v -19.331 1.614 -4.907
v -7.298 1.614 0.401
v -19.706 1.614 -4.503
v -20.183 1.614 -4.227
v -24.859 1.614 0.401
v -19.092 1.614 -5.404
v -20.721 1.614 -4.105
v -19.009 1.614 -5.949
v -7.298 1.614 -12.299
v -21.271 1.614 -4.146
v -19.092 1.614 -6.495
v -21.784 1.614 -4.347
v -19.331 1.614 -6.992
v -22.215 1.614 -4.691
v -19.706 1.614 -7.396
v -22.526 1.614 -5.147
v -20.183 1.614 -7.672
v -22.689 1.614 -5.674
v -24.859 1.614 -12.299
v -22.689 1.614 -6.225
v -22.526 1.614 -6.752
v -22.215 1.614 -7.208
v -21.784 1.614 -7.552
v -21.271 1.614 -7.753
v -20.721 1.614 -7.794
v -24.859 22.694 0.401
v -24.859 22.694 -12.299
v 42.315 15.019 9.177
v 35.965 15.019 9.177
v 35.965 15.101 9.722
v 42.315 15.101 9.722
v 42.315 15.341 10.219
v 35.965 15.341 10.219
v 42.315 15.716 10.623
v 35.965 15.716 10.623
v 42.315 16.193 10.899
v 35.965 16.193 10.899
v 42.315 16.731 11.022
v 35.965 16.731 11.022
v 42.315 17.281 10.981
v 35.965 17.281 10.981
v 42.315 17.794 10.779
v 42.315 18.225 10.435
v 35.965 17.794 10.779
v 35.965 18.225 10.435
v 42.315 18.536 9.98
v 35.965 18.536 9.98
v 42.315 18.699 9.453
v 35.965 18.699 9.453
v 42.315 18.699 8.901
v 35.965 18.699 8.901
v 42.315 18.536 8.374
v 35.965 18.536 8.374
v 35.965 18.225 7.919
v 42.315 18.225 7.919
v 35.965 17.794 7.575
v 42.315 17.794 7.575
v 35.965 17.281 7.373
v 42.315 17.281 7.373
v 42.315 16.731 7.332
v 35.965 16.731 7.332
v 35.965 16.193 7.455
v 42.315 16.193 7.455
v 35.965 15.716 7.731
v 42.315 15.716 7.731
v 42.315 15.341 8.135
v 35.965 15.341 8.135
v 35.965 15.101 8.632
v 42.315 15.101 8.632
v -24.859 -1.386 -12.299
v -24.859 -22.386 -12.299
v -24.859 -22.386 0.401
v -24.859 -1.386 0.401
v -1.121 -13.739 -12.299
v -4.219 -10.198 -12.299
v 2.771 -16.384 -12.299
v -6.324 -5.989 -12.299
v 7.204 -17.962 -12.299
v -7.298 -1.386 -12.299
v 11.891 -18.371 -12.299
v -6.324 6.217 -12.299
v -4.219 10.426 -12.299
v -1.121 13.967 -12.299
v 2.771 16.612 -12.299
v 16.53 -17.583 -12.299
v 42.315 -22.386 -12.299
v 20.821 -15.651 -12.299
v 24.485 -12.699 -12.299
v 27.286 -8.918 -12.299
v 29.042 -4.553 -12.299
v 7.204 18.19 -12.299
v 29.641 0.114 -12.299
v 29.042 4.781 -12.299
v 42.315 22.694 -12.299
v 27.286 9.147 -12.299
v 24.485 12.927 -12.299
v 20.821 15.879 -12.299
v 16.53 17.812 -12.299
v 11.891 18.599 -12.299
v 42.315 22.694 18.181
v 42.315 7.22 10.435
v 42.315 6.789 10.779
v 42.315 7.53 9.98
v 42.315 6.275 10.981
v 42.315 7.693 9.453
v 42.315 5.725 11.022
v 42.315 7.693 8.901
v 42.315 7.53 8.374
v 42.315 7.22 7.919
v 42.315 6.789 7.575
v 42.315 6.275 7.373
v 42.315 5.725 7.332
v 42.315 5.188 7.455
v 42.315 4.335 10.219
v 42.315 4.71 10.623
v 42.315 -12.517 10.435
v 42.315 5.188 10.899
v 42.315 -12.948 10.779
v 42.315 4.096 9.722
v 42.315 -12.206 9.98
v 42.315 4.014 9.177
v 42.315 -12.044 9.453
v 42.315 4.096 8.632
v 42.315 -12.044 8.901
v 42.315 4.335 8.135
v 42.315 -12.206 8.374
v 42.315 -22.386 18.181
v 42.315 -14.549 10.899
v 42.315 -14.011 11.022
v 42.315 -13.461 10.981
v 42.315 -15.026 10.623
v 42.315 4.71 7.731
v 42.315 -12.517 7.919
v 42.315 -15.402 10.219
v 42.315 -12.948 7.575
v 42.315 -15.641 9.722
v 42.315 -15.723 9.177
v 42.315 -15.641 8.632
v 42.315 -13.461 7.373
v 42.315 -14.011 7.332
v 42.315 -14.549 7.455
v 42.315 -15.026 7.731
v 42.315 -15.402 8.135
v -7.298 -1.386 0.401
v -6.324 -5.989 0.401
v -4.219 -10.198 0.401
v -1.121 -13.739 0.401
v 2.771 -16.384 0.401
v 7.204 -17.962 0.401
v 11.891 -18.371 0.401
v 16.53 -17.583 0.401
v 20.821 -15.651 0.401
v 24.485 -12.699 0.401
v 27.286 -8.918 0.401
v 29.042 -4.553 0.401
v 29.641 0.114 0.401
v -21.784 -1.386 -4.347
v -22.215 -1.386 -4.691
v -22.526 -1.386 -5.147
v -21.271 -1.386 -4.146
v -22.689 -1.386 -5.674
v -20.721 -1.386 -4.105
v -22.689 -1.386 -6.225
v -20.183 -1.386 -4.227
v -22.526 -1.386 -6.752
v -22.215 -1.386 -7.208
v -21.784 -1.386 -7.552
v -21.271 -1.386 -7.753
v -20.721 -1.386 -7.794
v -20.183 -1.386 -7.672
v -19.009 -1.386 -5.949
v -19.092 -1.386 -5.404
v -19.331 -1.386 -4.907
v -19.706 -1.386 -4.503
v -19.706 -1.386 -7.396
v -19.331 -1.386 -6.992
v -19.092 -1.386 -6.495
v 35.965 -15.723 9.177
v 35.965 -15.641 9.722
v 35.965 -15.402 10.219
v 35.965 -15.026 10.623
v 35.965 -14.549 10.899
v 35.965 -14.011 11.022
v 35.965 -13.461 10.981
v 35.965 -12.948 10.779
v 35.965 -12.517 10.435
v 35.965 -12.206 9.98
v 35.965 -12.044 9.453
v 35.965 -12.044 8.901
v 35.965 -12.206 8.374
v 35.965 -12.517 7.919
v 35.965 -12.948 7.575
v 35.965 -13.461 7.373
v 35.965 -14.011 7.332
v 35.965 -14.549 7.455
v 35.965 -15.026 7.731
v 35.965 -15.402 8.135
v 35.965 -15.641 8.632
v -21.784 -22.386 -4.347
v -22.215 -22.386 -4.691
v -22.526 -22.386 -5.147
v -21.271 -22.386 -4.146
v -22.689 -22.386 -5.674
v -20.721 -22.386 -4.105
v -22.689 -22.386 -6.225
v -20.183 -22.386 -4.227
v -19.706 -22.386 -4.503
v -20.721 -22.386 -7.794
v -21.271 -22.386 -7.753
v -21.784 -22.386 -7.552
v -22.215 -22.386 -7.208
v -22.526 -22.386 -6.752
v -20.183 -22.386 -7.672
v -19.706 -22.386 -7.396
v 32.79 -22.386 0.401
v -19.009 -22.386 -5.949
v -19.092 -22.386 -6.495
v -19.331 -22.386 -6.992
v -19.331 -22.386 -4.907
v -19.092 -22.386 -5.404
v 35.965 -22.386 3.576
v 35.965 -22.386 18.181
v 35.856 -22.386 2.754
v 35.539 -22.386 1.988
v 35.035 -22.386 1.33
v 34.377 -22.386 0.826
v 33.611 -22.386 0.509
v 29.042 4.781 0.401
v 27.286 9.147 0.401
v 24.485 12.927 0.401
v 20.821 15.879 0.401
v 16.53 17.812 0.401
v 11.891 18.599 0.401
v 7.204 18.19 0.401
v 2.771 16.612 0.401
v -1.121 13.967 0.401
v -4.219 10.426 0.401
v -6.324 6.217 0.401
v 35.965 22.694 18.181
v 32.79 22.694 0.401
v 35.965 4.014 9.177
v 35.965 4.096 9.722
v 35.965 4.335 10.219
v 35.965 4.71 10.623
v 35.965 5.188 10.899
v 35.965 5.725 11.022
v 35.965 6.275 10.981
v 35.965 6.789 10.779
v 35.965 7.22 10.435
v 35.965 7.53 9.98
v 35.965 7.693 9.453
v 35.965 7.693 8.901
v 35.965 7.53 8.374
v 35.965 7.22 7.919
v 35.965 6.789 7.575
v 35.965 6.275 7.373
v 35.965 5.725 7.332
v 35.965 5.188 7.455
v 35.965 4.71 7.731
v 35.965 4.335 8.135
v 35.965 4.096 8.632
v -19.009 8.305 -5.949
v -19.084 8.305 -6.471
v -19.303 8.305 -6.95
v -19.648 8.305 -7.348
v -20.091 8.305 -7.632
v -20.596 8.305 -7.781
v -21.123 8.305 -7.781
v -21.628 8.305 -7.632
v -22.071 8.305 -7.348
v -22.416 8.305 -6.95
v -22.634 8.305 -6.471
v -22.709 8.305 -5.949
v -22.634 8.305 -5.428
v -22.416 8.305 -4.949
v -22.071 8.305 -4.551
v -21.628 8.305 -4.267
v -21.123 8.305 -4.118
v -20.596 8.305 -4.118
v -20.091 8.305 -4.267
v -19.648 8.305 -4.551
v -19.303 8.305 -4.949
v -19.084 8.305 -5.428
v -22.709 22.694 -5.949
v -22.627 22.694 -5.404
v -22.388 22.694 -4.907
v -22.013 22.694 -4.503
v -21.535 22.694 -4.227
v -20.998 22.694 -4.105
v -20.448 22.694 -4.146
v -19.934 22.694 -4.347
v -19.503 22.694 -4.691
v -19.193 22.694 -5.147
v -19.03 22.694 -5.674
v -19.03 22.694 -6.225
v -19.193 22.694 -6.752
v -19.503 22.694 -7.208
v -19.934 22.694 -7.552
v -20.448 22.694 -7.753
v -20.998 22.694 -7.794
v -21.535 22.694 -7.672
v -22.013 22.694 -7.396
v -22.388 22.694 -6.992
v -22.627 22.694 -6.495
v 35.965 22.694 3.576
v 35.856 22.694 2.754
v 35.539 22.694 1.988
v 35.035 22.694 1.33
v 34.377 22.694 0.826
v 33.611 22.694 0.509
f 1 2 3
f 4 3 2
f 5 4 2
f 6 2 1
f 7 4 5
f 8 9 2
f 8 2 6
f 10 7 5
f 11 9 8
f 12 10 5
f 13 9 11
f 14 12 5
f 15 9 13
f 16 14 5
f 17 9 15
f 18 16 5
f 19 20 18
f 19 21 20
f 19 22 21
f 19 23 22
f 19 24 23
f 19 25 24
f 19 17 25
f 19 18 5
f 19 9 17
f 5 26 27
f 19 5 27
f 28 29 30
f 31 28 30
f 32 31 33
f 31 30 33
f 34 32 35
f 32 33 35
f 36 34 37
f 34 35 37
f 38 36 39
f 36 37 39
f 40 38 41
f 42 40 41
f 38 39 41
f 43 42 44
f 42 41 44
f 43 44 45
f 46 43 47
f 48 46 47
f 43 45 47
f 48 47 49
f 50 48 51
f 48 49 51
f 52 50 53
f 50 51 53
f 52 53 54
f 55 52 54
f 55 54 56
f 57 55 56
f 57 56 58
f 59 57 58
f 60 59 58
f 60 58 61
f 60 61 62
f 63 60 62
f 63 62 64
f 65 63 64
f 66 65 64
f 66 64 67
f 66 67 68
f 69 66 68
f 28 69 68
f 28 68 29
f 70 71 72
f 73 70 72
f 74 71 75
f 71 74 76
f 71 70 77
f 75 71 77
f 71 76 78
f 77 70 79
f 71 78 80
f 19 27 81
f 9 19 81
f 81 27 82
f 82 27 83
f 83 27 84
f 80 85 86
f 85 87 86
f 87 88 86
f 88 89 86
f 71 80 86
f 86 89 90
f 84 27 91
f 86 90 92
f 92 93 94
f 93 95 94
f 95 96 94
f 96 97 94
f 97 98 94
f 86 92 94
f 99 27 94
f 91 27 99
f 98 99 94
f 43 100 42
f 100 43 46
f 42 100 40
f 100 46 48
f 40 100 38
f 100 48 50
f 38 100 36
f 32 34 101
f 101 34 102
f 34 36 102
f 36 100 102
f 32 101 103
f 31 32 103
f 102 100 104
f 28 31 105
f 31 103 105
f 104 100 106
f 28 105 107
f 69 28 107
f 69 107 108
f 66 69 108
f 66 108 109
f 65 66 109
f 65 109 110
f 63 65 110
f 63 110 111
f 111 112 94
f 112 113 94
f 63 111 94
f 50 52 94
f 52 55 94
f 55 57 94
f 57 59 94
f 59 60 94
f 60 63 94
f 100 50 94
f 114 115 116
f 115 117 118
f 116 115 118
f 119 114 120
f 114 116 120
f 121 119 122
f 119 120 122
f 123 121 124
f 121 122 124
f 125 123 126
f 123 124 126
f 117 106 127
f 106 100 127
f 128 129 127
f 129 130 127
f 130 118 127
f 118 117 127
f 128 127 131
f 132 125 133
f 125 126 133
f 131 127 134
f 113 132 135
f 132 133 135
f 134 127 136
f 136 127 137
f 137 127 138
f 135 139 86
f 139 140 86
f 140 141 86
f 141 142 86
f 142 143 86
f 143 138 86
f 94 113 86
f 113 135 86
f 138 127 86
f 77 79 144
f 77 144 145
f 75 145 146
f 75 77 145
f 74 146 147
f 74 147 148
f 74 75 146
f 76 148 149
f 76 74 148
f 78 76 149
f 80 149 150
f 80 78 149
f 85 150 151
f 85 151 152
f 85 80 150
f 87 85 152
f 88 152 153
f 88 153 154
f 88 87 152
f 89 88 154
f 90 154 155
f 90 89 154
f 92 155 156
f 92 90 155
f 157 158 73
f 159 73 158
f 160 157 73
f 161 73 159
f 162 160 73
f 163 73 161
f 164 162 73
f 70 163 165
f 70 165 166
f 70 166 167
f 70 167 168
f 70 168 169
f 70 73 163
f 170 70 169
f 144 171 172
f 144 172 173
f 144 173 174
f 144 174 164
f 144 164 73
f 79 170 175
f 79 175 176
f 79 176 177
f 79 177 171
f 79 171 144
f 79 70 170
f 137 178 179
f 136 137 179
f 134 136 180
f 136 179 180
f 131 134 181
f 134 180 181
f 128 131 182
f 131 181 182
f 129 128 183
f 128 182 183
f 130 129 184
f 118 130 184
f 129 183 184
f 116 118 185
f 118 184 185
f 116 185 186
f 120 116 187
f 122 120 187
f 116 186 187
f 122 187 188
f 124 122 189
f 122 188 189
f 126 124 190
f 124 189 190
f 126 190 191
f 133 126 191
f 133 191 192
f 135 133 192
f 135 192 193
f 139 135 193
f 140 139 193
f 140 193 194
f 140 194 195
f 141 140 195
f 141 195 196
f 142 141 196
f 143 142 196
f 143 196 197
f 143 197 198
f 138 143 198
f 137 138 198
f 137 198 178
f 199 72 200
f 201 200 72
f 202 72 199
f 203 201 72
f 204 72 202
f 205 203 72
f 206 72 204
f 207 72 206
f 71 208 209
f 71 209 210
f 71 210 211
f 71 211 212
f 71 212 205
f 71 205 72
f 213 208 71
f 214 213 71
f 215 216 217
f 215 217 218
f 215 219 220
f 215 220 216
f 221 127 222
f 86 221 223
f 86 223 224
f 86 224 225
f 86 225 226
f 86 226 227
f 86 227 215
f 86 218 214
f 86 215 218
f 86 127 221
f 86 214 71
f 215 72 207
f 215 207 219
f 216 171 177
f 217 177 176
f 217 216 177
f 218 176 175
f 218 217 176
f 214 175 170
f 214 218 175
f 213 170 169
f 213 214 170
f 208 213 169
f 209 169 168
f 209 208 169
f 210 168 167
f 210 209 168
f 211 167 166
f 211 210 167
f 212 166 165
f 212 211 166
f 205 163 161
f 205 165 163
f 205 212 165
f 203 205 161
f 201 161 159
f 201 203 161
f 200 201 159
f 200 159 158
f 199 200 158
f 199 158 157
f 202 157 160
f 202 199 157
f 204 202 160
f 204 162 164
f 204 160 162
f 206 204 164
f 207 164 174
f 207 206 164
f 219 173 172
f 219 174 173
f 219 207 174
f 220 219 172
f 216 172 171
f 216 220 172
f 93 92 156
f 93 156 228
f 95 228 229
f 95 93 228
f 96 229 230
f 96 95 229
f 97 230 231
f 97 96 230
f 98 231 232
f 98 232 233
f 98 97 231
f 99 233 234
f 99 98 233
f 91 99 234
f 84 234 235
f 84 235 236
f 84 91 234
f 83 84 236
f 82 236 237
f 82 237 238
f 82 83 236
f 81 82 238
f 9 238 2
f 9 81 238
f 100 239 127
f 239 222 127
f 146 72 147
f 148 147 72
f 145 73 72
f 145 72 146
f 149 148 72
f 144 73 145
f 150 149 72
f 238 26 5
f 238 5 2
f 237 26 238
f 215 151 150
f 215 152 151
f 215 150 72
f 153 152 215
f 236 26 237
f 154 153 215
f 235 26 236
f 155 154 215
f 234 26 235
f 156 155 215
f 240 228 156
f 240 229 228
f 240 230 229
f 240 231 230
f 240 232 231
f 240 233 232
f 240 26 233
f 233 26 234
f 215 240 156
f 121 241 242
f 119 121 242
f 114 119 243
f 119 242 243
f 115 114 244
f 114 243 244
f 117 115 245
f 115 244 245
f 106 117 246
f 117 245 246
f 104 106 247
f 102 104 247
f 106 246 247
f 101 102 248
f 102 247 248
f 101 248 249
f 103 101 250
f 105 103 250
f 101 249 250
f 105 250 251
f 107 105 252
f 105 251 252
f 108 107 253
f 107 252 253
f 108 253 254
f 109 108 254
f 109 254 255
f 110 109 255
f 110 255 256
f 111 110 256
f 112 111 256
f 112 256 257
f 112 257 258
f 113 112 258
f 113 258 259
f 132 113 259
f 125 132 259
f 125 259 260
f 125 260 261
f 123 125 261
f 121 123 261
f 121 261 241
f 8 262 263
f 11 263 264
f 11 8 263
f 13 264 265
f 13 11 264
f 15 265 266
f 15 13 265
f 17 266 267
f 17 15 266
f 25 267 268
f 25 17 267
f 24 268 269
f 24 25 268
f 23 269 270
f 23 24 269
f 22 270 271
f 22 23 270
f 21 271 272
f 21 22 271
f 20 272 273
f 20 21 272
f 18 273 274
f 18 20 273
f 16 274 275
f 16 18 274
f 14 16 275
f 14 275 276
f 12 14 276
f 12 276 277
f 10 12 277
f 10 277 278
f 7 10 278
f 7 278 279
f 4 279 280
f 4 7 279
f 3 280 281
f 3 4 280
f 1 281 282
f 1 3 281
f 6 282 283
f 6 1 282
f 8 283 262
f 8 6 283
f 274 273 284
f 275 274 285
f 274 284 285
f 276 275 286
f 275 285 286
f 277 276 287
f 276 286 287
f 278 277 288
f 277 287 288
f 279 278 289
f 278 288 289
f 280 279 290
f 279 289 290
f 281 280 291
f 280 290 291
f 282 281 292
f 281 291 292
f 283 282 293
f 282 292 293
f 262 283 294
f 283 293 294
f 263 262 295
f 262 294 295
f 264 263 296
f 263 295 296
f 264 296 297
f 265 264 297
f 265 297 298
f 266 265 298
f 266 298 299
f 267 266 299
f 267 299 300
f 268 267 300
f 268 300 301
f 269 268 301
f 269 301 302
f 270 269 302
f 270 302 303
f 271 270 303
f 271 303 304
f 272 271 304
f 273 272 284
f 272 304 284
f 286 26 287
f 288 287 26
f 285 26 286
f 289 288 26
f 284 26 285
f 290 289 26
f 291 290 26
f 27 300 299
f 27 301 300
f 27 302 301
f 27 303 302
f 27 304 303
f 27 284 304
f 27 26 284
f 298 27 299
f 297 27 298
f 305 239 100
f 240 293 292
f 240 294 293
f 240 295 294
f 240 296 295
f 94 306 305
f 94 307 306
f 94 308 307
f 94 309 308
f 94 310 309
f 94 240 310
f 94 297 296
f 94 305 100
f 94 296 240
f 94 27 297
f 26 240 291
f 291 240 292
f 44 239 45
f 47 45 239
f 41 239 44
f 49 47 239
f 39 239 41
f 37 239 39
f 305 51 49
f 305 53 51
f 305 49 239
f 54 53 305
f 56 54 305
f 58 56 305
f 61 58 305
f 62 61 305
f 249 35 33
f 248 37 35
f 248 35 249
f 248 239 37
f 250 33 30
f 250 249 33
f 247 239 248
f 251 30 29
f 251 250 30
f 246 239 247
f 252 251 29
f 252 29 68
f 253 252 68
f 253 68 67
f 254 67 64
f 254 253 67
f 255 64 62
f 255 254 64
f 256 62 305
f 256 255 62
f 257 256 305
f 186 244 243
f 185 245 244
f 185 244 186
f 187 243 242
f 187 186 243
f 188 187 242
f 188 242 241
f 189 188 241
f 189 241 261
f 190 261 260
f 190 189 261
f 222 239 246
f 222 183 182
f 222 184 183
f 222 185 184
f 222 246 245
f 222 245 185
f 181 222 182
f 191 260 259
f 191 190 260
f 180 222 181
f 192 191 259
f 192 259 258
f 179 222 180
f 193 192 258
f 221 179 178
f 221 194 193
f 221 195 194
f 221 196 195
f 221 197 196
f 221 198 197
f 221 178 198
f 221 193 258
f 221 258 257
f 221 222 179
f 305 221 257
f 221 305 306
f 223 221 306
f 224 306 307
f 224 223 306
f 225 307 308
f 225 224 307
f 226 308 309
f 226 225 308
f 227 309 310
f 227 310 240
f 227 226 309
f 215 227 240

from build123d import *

# Parameters (mm, degrees)
CUT_EXTRUDE1_START       = -22.385915399
CUT_EXTRUDE1_OUTLINE_R   = 1.85
CUT_EXTRUDE1_DEPTH       = 4
CUT_EXTRUDE1_START_2     = -18.385915399
CUT_EXTRUDE1_2_OUTLINE_R = 1.85
CUT_EXTRUDE1_2_DEPTH     = 40.98
CUT_EXTRUDE1_START_3     = -12.299495873
CUT_EXTRUDE1_3_DEPTH     = 12.7
SKETCH2_W                = 30.48
SKETCH2_H                = 44.98
BOSS_EXTRUDE1_DEPTH      = 6.35
CUT_EXTRUDE2_REACH       = 69.384
SKETCH3_R                = 1.85
BOSS_EXTRUDE3_REACH      = 66.446
SKETCH4_W                = 67.174
SKETCH4_H                = 12.7
SKETCH5_W                = 6.35
SKETCH5_H                = 17.78
BOSS_EXTRUDE4_DEPTH      = 0.1
FILLET1_R                = 3.175


with BuildPart() as part:
    # Cut-Extrude1: read off the stored shape, not the designer's step
    # Cut-Extrude1 outline → Cut-Extrude1 (new body)
    with BuildSketch(Plane(origin=(0, 0, 0), x_dir=(1, 0, 0), z_dir=(0, 1, 0)).offset(CUT_EXTRUDE1_START)):
        with BuildLine():
            ThreePointArc((41.290674946, 5.949495873), (41.56736633, 6.922737878), (42.314674946, 7.604858069))
            Line((42.314674946, 7.604858069), (42.314674946, 12.299495873))
            Line((42.314674946, 12.299495873), (-24.859325054, 12.299495873))
            Line((-24.859325054, 12.299495873), (-24.859325054, -0.400504127))
            Line((-24.859325054, -0.400504127), (42.314674946, -0.400504127))
            Line((42.314674946, -0.400504127), (42.314674946, 4.294133677))
            ThreePointArc((42.314674946, 4.294133677), (41.56736633, 4.976253868), (41.290674946, 5.949495873))
        make_face()
        with Locations((-20.859325054, 5.949495873)):
            Circle(CUT_EXTRUDE1_OUTLINE_R, mode=Mode.SUBTRACT)
    extrude(amount=CUT_EXTRUDE1_DEPTH)

    # Cut-Extrude1 2 outline → Cut-Extrude1 2 (add)
    with BuildSketch(Plane(origin=(0, 0, 0), x_dir=(1, 0, 0), z_dir=(0, 1, 0)).offset(CUT_EXTRUDE1_START_2)):
        with BuildLine():
            ThreePointArc((41.290674946, 5.949495873), (41.56736633, 6.922737878), (42.314674946, 7.604858069))
            Line((42.314674946, 7.604858069), (42.314674946, 12.299495873))
            Line((42.314674946, 12.299495873), (-24.859325054, 12.299495873))
            Line((-24.859325054, 12.299495873), (-24.859325054, -0.400504127))
            Line((-24.859325054, -0.400504127), (42.314674946, -0.400504127))
            Line((42.314674946, -0.400504127), (42.314674946, 4.294133677))
            ThreePointArc((42.314674946, 4.294133677), (41.56736633, 4.976253868), (41.290674946, 5.949495873))
        make_face()
        with Locations((-20.859325054, 5.949495873)):
            Circle(CUT_EXTRUDE1_2_OUTLINE_R, mode=Mode.SUBTRACT)
    extrude(amount=CUT_EXTRUDE1_2_DEPTH)

    # Cut-Extrude1 3 outline → Cut-Extrude1 3 (cut)
    with BuildSketch(Plane.XY.offset(CUT_EXTRUDE1_START_3)):
        with BuildLine():
            Line((-7.298413969, 1.614084601), (-24.859325054, 1.614084601))
            Line((-24.859325054, 1.614084601), (-24.859325054, -1.385915399))
            Line((-24.859325054, -1.385915399), (-7.298413969, -1.385915399))
            ThreePointArc((-7.298413969, -1.385915399), (11.891293051, -18.370681356), (29.640674946, 0.114084601))
            ThreePointArc((29.640674946, 0.114084601), (11.891293051, 18.598850557), (-7.298413969, 1.614084601))
        make_face()
        with BuildLine():
            ThreePointArc((-8.270513308, 11.452345957), (-0.050086584, 19.610680621), (11.140674816, 22.594084601))
            Line((11.140674816, 22.594084601), (-24.859325054, 22.594084601))
            Line((-24.859325054, 22.594084601), (-24.859325054, 6.805102167))
            ThreePointArc((-24.859325054, 6.805102167), (-24.419985226, 7.865762339), (-23.359325054, 8.305102167))
            Line((-23.359325054, 8.305102167), (-13.753655898, 8.305102167))
            ThreePointArc((-13.753655898, 8.305102167), (-10.592564467, 9.147834154), (-8.270513308, 11.452345957))
        make_face()
        with BuildLine():
            Line((39.26266634, 0.114084601), (42.314674946, 0.114084601))
            Line((42.314674946, 0.114084601), (42.314674946, 22.594084601))
            Line((42.314674946, 22.594084601), (11.140674816, 22.594084601))
            ThreePointArc((11.140674816, 22.594084601), (25.177120317, 17.67337278), (33.068609963, 5.065454701))
            ThreePointArc((33.068609963, 5.065454701), (35.297745147, 1.504054366), (39.26266634, 0.114084601))
        make_face()
    extrude(amount=CUT_EXTRUDE1_3_DEPTH, mode=Mode.SUBTRACT)

    # Sketch2 → Boss-Extrude1 (add)
    with BuildSketch(Plane(origin=(42.314674946, 0, 0), x_dir=(0, 0, -1), z_dir=(1, 0, 0))):
        with Locations((-2.940504127, 0.104084601)):
            Rectangle(SKETCH2_W, SKETCH2_H)
    extrude(amount=-BOSS_EXTRUDE1_DEPTH)

    # Sketch3 → Cut-Extrude2 (cut, up to next)
    with BuildSketch(Plane.ZY.offset(-35.964674946), mode=Mode.PRIVATE) as cut_extrude2_sk1:
        with Locations(Location((9.177002591, 16.869259883, 0), (0, 0, 270))):
            Circle(SKETCH3_R)
    cut_extrude2_tool1 = extrude(cut_extrude2_sk1.sketch, amount=-CUT_EXTRUDE2_REACH, mode=Mode.PRIVATE) & part.part
    # Sketch3 → Cut-Extrude2 (cut, up to next)
    with BuildSketch(Plane.ZY.offset(-35.964674946), mode=Mode.PRIVATE) as cut_extrude2_sk2:
        with Locations(Location((9.177002591, 5.863674358, 0), (0, 0, 270))):
            Circle(SKETCH3_R)
    cut_extrude2_tool2 = extrude(cut_extrude2_sk2.sketch, amount=-CUT_EXTRUDE2_REACH, mode=Mode.PRIVATE) & part.part
    # Sketch3 → Cut-Extrude2 (cut, up to next)
    with BuildSketch(Plane.ZY.offset(-35.964674946), mode=Mode.PRIVATE) as cut_extrude2_sk3:
        with Locations(Location((9.177002591, -13.873009015, 0), (0, 0, 270))):
            Circle(SKETCH3_R)
    cut_extrude2_tool3 = extrude(cut_extrude2_sk3.sketch, amount=-CUT_EXTRUDE2_REACH, mode=Mode.PRIVATE) & part.part
    add(cut_extrude2_tool1.solids().sort_by_distance((35.964675, 16.86926, 9.177003))[0], mode=Mode.SUBTRACT)
    add(cut_extrude2_tool2.solids().sort_by_distance((35.964675, 5.863674, 9.177003))[0], mode=Mode.SUBTRACT)
    add(cut_extrude2_tool3.solids().sort_by_distance((35.964675, -13.873009, 9.177003))[0], mode=Mode.SUBTRACT)

    # Sketch4 → Boss-Extrude3 (add, up to next)
    with BuildSketch(Plane(origin=(0, 22.694084601, 0), x_dir=(1, 0, 0), z_dir=(0, 1, 0)), mode=Mode.PRIVATE) as boss_extrude3_sk1:
        with Locations((8.727674946, 5.949495873)):
            Rectangle(SKETCH4_W, SKETCH4_H)
        with BuildLine():
            ThreePointArc((-19.009325054, 5.949495873), (-20.859325054, 7.799495873), (-22.709325054, 5.949495873))
            ThreePointArc((-22.709325054, 5.949495873), (-20.859325054, 4.099495873), (-19.009325054, 5.949495873))
        make_face(mode=Mode.SUBTRACT)
    boss_extrude3_tool1 = extrude(boss_extrude3_sk1.sketch, amount=-BOSS_EXTRUDE3_REACH, mode=Mode.PRIVATE) - part.part
    add(boss_extrude3_tool1.solids().sort_by_distance((9.105332, 22.694085, -5.949496))[0])

    # Sketch5 → Boss-Extrude4 (add)
    with BuildSketch(Plane(origin=(0, 22.594084601, 0), x_dir=(1, 0, 0), z_dir=(0, 1, 0))):
        with Locations((39.139674946, -9.290504127)):
            Rectangle(SKETCH5_W, SKETCH5_H)
    extrude(amount=BOSS_EXTRUDE4_DEPTH)

    # Fillet1
    fillet1_edges = [part.edges().sort_by_distance(p)[0] for p in [
        (35.964674946, -10.674112441, 0.400504127),
    ]]
    fillet(fillet1_edges, radius=FILLET1_R)


solid = part.part
